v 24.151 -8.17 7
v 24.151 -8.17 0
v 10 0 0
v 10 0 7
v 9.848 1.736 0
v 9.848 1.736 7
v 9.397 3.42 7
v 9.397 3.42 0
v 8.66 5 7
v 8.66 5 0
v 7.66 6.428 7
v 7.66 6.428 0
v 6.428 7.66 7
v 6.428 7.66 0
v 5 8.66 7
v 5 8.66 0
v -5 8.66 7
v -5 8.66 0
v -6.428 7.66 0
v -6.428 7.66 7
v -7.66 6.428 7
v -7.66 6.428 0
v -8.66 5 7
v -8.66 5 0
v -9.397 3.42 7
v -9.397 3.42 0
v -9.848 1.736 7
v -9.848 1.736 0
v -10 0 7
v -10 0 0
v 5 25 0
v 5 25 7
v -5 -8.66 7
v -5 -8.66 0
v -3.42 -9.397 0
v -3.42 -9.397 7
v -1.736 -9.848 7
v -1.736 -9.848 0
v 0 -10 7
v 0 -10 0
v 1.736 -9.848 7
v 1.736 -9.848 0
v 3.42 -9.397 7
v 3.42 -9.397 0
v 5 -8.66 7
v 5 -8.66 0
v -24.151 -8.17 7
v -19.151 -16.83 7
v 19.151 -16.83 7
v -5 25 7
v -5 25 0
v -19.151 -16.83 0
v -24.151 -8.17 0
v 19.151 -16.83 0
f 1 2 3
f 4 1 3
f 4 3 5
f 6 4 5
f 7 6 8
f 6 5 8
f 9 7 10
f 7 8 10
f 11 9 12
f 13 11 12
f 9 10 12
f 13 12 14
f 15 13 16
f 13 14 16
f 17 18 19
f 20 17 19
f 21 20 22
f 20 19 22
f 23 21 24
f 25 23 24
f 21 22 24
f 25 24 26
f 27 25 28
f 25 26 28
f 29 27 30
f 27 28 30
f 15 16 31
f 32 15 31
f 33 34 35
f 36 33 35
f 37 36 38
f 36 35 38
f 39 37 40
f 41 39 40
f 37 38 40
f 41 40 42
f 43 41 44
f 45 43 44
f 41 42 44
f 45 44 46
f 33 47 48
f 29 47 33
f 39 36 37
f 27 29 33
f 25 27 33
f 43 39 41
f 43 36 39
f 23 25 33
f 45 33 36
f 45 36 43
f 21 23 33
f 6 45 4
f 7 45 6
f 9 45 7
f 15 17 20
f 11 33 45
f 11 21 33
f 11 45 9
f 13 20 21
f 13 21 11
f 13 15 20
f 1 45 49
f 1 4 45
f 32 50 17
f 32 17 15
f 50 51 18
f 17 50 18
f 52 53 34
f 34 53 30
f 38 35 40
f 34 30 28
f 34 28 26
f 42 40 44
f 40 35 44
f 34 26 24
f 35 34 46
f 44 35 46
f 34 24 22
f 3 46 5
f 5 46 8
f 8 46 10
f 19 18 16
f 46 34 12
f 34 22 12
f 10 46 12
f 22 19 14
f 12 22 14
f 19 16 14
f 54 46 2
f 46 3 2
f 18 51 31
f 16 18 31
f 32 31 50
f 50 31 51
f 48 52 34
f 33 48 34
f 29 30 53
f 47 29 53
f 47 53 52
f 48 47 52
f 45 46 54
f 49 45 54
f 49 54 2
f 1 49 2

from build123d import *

# Parameters (mm, degrees)
F2_DEPTH = 7


with BuildPart() as f2:
    # F1 (on Top) → F2 (new body)
    with BuildSketch(Plane.XY):
        with BuildLine():
            Line((0, 0), (-5, 0))
            Line((-5, 0), (-5, 5))
            Line((-5, 5), (-5, 8.660254))
            ThreePointArc((-5, 8.660254), (-8.660254, 5), (-10, 0))
            ThreePointArc((-10, 0), (-8.660254, -5), (-5, -8.660254))
            ThreePointArc((-5, -8.660254), (0, -10), (5, -8.660254))
            ThreePointArc((5, -8.660254), (8.660254, -5), (10, 0))
            ThreePointArc((10, 0), (8.660254, 5), (5, 8.660254))
            Line((5, 8.660254), (5, 5))
            Line((5, 5), (5, 0))
            Line((5, 0), (0, 0))
        make_face()
        with BuildLine():
            Line((24.150635, -8.169873), (10, 0))
            ThreePointArc((10, 0), (8.660254, -5), (5, -8.660254))
            Line((5, -8.660254), (19.150635, -16.830127))
            Line((19.150635, -16.830127), (24.150635, -8.169873))
        make_face()
        Polygon((5, 5), (0, 0), (5, 0), align=None)
        Polygon((-5, 5), (-5, 0), (0, 0), align=None)
        with BuildLine():
            Line((-5, 5), (0, 0))
            Line((0, 0), (5, 5))
            Line((5, 5), (5, 8.660254))
            ThreePointArc((5, 8.660254), (0, 10), (-5, 8.660254))
            Line((-5, 8.660254), (-5, 5))
        make_face()
        with BuildLine():
            Line((-5, 25), (-5, 8.660254))
            ThreePointArc((-5, 8.660254), (0, 10), (5, 8.660254))
            Line((5, 8.660254), (5, 25))
            Line((5, 25), (-5, 25))
        make_face()
        with BuildLine():
            ThreePointArc((-5, -8.660254), (-8.660254, -5), (-10, 0))
            Line((-10, 0), (-24.150635, -8.169873))
            Line((-24.150635, -8.169873), (-19.150635, -16.830127))
            Line((-19.150635, -16.830127), (-5, -8.660254))
        make_face()
    extrude(amount=F2_DEPTH)


solid = f2.part
